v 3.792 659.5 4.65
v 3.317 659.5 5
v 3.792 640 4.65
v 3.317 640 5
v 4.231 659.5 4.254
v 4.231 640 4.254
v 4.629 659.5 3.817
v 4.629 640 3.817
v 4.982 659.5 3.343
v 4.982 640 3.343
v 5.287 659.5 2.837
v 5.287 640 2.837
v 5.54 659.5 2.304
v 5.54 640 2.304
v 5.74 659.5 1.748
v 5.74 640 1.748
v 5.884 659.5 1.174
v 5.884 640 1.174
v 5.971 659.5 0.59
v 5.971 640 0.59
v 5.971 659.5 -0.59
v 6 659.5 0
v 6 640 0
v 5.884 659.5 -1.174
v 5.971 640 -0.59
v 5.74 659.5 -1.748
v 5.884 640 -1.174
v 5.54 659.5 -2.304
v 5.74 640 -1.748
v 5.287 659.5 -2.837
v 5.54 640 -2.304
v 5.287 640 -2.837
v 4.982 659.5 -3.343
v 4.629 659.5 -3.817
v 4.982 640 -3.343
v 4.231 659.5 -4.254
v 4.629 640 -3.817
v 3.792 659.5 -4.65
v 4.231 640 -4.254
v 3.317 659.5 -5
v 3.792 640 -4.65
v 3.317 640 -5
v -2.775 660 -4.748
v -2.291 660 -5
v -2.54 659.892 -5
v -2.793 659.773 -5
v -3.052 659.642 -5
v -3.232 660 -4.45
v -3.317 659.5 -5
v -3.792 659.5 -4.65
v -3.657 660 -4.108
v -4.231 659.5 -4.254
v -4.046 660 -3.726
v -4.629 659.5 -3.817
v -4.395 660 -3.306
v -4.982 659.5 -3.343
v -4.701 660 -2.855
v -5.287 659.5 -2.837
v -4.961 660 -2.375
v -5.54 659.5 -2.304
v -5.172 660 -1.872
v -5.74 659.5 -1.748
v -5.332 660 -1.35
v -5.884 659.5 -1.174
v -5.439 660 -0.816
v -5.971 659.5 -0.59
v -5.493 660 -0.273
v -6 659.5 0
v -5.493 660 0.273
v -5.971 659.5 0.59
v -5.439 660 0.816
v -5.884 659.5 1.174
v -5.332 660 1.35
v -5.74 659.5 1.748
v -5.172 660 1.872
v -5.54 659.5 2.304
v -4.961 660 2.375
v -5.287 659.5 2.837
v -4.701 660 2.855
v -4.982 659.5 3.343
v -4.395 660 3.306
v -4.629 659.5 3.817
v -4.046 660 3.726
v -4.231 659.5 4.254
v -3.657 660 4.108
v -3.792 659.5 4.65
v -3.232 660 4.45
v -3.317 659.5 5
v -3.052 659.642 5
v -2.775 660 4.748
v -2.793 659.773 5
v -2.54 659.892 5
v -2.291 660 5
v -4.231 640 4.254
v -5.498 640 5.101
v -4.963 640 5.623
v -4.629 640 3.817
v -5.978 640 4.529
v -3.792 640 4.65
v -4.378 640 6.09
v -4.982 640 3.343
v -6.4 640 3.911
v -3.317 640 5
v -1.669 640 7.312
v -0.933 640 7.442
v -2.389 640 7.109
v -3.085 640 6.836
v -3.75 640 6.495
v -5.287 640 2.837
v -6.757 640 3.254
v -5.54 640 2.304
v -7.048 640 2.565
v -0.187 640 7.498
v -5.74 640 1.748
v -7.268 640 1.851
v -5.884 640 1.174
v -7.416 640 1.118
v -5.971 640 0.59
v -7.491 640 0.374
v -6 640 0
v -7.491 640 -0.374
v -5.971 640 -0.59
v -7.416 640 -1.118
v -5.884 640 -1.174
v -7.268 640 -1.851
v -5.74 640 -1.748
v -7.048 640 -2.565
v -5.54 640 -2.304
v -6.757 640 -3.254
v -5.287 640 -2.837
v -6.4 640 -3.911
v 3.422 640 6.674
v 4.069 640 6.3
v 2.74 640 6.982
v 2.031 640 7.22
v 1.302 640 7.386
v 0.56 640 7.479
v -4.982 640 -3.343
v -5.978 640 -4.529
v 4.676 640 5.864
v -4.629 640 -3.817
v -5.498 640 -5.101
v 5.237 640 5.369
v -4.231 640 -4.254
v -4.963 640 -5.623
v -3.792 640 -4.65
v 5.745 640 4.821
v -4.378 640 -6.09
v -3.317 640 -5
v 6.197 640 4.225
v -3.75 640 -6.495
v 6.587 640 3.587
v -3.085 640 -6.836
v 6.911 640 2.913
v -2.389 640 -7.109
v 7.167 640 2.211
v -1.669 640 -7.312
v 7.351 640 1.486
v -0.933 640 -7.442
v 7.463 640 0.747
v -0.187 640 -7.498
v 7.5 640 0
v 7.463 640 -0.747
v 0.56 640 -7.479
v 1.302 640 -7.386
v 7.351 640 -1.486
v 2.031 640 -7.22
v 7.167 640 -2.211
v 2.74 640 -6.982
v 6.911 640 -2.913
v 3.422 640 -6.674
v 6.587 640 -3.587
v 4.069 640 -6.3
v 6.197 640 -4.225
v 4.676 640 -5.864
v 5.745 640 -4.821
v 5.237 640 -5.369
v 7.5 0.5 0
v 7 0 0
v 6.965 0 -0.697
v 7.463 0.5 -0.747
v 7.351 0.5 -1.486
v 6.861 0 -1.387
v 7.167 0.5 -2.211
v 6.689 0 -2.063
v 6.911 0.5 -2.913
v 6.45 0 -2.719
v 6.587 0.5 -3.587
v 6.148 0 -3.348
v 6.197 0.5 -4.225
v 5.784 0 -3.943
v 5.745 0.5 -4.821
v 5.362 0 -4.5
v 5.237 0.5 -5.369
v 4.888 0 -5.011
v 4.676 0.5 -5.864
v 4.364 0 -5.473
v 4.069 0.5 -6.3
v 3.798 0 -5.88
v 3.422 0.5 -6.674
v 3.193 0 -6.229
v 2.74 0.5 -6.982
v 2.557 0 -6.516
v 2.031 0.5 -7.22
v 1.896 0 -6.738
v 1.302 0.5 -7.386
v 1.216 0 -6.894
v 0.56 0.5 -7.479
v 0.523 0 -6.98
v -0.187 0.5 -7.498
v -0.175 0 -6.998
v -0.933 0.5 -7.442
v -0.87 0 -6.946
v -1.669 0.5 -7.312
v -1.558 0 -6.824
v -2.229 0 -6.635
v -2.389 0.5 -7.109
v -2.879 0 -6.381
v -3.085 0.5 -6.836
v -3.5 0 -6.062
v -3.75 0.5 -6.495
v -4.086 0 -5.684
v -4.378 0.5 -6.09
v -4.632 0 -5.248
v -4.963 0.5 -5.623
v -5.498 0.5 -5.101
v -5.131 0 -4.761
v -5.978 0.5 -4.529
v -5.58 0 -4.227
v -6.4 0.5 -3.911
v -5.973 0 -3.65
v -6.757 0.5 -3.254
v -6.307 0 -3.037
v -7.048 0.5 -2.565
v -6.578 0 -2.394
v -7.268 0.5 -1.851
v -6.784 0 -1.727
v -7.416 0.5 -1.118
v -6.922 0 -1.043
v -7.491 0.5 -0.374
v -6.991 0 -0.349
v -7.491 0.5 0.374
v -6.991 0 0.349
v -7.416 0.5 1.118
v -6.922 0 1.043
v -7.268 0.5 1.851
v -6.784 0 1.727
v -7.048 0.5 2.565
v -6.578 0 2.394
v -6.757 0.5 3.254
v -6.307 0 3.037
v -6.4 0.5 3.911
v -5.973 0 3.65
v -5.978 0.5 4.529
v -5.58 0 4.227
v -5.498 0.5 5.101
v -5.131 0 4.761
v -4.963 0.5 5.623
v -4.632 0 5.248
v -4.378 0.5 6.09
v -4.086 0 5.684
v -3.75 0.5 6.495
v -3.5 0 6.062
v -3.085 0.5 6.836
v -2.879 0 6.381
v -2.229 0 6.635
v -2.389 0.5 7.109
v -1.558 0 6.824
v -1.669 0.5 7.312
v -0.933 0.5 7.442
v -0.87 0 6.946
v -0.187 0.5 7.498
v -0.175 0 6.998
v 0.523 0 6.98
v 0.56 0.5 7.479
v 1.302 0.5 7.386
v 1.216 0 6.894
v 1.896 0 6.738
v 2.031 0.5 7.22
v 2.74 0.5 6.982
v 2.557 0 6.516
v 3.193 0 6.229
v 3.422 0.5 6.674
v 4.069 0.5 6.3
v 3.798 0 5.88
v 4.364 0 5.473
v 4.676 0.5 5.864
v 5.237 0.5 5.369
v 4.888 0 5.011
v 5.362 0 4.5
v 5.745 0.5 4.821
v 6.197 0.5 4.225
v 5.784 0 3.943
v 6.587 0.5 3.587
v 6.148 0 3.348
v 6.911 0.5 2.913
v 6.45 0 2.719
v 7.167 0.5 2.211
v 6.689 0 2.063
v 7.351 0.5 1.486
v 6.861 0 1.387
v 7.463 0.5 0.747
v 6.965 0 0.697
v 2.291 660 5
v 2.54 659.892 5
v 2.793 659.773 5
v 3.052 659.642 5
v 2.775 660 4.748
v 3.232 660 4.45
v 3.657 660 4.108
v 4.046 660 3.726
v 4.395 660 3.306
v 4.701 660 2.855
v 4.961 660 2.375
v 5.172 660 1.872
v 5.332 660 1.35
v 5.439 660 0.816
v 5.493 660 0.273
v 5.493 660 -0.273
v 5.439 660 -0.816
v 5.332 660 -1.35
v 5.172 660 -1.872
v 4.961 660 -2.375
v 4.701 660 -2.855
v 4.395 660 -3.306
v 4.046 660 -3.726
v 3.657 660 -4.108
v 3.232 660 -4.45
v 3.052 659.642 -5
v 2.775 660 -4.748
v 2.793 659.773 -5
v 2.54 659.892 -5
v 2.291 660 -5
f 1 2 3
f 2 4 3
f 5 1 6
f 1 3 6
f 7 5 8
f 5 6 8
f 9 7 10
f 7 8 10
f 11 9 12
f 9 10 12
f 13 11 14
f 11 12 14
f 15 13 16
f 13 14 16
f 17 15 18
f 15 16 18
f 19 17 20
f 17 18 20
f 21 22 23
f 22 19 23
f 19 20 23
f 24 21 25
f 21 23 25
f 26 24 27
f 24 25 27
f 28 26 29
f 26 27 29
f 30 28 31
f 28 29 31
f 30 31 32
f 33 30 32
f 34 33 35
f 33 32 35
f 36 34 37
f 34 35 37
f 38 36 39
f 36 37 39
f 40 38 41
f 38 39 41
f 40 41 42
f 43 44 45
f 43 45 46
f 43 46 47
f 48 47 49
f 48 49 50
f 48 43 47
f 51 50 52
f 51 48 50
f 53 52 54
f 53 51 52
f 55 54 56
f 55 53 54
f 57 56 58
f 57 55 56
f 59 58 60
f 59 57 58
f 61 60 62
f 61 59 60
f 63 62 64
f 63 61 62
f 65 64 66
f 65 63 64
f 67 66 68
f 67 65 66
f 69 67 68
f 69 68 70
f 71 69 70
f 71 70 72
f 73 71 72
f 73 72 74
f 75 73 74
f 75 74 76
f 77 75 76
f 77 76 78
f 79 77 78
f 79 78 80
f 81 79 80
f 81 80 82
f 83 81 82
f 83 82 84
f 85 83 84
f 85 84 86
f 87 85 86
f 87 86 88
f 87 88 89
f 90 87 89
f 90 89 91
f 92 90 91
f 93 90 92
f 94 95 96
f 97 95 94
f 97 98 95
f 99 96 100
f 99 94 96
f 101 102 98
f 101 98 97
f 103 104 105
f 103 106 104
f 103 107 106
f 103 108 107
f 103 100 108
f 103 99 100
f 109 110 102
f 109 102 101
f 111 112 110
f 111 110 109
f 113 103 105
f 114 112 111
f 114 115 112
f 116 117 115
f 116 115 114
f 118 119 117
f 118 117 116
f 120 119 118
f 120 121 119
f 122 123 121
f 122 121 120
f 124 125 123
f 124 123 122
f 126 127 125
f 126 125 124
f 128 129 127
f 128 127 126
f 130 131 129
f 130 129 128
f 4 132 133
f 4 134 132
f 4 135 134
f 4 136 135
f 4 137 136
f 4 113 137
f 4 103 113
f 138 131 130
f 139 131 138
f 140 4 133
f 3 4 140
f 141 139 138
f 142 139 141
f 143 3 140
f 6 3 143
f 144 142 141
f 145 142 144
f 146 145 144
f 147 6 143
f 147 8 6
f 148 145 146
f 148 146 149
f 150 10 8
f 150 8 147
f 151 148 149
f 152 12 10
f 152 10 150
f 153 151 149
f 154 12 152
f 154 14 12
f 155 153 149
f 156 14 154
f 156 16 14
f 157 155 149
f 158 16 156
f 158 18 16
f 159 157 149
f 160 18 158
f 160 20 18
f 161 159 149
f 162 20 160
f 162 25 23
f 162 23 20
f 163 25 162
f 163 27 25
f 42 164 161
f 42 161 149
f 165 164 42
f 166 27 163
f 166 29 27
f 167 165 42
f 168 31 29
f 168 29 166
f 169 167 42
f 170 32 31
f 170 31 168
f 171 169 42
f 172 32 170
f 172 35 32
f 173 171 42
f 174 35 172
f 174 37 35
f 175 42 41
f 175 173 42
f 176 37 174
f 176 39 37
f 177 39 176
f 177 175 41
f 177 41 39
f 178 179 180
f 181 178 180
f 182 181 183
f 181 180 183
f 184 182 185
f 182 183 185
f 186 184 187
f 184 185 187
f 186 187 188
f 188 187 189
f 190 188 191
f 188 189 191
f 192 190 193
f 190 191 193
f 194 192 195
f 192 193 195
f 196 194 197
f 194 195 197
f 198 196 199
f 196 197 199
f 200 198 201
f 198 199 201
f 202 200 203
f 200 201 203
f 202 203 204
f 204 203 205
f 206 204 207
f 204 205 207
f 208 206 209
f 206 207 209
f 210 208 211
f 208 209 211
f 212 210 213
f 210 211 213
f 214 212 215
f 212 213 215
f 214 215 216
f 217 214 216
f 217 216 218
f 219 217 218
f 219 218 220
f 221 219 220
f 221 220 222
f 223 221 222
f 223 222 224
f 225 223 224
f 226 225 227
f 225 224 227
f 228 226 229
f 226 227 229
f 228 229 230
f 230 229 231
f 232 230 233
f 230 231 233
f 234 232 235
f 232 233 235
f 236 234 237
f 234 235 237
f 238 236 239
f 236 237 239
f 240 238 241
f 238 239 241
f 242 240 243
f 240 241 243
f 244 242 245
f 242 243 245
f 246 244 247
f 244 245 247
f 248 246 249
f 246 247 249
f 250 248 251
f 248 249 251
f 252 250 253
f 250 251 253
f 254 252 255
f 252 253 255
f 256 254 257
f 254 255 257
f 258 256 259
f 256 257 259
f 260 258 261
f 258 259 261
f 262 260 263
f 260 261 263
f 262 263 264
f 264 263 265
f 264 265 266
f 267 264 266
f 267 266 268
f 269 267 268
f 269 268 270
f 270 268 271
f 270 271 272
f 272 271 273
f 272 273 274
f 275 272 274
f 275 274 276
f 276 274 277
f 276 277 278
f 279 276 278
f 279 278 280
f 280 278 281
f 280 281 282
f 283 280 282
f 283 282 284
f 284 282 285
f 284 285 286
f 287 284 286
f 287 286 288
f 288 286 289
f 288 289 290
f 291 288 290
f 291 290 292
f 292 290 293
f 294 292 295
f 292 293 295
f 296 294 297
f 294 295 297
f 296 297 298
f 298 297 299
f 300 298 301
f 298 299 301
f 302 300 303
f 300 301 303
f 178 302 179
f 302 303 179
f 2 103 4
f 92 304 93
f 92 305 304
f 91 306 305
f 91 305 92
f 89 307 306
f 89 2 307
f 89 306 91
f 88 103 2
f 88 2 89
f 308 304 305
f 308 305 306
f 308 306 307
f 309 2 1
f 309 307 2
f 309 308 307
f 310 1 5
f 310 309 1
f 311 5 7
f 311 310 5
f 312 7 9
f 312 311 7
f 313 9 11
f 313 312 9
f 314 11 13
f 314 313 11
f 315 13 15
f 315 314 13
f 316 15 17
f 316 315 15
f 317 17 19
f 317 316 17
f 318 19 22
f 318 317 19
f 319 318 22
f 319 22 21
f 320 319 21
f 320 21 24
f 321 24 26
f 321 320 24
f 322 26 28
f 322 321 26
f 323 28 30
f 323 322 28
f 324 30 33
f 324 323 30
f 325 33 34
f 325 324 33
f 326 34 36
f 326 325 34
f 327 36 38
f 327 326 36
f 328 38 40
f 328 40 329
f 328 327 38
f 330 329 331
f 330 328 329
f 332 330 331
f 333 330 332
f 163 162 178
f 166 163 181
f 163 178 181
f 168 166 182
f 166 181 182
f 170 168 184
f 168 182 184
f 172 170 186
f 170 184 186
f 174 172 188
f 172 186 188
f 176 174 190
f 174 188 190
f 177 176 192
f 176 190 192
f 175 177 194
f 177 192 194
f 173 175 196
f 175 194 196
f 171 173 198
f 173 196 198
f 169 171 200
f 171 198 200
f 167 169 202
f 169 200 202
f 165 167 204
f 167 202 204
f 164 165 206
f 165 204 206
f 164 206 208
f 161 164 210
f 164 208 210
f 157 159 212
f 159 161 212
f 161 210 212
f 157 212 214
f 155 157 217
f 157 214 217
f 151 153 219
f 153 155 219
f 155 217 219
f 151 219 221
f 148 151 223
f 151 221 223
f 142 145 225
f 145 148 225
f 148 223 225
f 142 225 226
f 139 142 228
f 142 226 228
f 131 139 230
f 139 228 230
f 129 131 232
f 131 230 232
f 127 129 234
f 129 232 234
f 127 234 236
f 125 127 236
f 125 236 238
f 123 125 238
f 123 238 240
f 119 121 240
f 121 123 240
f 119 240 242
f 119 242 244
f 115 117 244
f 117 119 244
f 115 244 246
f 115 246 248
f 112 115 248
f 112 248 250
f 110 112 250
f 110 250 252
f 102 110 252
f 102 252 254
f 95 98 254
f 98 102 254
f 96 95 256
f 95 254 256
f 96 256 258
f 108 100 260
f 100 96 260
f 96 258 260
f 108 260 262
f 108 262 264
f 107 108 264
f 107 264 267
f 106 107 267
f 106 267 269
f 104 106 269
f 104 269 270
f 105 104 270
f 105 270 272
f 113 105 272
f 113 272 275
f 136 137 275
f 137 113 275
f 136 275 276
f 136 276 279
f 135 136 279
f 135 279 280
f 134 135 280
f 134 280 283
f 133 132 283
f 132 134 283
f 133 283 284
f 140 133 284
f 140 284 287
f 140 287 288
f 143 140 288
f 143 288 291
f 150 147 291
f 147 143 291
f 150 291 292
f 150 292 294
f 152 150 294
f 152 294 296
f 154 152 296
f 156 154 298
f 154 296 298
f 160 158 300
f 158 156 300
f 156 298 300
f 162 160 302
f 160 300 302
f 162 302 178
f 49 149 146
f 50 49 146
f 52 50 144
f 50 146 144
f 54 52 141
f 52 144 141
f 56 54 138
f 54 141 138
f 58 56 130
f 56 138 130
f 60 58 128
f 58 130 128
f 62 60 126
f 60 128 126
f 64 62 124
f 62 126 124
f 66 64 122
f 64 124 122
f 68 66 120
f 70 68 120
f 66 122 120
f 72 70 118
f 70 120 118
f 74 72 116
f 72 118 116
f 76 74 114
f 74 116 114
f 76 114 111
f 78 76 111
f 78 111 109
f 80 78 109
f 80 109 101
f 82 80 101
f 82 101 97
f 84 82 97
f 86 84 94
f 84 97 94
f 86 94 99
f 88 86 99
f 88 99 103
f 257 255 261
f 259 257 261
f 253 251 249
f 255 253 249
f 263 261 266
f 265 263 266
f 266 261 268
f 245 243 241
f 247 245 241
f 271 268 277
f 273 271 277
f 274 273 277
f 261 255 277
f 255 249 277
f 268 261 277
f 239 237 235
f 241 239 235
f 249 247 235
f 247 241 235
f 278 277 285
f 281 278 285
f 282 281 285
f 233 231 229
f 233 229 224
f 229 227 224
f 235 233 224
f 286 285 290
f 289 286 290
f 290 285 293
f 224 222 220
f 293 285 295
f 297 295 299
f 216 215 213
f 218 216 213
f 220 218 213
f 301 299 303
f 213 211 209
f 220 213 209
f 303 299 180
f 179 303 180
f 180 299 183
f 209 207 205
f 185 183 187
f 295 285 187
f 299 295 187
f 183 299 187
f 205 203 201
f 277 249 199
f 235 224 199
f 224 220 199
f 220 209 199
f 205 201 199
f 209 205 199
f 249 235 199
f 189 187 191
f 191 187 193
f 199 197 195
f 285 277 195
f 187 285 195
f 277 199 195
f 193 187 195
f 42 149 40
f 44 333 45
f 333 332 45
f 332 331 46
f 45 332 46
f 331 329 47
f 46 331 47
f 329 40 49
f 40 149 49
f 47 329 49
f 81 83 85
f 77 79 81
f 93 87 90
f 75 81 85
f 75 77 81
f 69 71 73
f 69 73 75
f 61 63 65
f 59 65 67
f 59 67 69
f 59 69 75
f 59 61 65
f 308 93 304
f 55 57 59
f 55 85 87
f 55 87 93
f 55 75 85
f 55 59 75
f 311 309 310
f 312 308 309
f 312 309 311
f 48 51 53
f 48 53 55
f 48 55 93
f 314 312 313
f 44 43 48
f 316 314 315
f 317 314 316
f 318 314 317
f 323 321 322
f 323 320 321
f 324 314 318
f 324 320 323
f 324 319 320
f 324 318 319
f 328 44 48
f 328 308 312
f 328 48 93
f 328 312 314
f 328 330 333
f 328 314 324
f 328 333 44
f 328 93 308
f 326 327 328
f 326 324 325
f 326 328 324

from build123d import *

# Parameters (mm, degrees)
SKETCH1_R               = 7.5
BOSS_EXTRUDE1_DEPTH     = 640
SKETCH2_R               = 6
BOSS_EXTRUDE2_DEPTH     = 20
CHAMFER1_SIZE           = 0.5
CHAMFER2_SIZE           = 0.5
CUT_EXTRUDE1_DEPTH      = 8.5
CUT_EXTRUDE1_DEPTH_BACK = 8.5


with BuildPart() as part:
    # Sketch1 → Boss-Extrude1 (new body)
    with BuildSketch(Plane(origin=(0, 0, 0), x_dir=(1, 0, 0), z_dir=(0, 1, 0))):
        Circle(SKETCH1_R)
    extrude(amount=BOSS_EXTRUDE1_DEPTH)

    # Sketch2 → Boss-Extrude2 (add)
    with BuildSketch(Plane(origin=(0, 640, 0), x_dir=(1, 0, 0), z_dir=(0, 1, 0))):
        Circle(SKETCH2_R)
    extrude(amount=BOSS_EXTRUDE2_DEPTH)

    # Chamfer1
    chamfer1_edges = [part.edges().sort_by_distance(p)[0] for p in [
        (-6, 660, 0),
    ]]
    chamfer(chamfer1_edges, length=CHAMFER1_SIZE)

    # Chamfer2
    chamfer2_edges = [part.edges().sort_by_distance(p)[0] for p in [
        (-7.5, 0, 0),
    ]]
    chamfer(chamfer2_edges, length=CHAMFER2_SIZE)

    # Sketch3 → Cut-Extrude1 (cut, two sides)
    with BuildSketch(Plane(origin=(0, 0, 0), x_dir=(0, 0, -1), z_dir=(1, 0, 0))) as cut_extrude1_sk:
        Polygon((11.720103358, 640), (5, 640), (5, 665.518180004), (13.892257978, 665.518180004), (13.892257978, 640), align=None)
        Polygon((-13.892257978, 640), (-11.720103358, 640), (-5, 640), (-5, 665.518180004), (-13.892257978, 665.518180004), align=None)
    extrude(amount=CUT_EXTRUDE1_DEPTH, mode=Mode.SUBTRACT)
    extrude(cut_extrude1_sk.sketch, amount=-CUT_EXTRUDE1_DEPTH_BACK, mode=Mode.SUBTRACT)


solid = part.part
